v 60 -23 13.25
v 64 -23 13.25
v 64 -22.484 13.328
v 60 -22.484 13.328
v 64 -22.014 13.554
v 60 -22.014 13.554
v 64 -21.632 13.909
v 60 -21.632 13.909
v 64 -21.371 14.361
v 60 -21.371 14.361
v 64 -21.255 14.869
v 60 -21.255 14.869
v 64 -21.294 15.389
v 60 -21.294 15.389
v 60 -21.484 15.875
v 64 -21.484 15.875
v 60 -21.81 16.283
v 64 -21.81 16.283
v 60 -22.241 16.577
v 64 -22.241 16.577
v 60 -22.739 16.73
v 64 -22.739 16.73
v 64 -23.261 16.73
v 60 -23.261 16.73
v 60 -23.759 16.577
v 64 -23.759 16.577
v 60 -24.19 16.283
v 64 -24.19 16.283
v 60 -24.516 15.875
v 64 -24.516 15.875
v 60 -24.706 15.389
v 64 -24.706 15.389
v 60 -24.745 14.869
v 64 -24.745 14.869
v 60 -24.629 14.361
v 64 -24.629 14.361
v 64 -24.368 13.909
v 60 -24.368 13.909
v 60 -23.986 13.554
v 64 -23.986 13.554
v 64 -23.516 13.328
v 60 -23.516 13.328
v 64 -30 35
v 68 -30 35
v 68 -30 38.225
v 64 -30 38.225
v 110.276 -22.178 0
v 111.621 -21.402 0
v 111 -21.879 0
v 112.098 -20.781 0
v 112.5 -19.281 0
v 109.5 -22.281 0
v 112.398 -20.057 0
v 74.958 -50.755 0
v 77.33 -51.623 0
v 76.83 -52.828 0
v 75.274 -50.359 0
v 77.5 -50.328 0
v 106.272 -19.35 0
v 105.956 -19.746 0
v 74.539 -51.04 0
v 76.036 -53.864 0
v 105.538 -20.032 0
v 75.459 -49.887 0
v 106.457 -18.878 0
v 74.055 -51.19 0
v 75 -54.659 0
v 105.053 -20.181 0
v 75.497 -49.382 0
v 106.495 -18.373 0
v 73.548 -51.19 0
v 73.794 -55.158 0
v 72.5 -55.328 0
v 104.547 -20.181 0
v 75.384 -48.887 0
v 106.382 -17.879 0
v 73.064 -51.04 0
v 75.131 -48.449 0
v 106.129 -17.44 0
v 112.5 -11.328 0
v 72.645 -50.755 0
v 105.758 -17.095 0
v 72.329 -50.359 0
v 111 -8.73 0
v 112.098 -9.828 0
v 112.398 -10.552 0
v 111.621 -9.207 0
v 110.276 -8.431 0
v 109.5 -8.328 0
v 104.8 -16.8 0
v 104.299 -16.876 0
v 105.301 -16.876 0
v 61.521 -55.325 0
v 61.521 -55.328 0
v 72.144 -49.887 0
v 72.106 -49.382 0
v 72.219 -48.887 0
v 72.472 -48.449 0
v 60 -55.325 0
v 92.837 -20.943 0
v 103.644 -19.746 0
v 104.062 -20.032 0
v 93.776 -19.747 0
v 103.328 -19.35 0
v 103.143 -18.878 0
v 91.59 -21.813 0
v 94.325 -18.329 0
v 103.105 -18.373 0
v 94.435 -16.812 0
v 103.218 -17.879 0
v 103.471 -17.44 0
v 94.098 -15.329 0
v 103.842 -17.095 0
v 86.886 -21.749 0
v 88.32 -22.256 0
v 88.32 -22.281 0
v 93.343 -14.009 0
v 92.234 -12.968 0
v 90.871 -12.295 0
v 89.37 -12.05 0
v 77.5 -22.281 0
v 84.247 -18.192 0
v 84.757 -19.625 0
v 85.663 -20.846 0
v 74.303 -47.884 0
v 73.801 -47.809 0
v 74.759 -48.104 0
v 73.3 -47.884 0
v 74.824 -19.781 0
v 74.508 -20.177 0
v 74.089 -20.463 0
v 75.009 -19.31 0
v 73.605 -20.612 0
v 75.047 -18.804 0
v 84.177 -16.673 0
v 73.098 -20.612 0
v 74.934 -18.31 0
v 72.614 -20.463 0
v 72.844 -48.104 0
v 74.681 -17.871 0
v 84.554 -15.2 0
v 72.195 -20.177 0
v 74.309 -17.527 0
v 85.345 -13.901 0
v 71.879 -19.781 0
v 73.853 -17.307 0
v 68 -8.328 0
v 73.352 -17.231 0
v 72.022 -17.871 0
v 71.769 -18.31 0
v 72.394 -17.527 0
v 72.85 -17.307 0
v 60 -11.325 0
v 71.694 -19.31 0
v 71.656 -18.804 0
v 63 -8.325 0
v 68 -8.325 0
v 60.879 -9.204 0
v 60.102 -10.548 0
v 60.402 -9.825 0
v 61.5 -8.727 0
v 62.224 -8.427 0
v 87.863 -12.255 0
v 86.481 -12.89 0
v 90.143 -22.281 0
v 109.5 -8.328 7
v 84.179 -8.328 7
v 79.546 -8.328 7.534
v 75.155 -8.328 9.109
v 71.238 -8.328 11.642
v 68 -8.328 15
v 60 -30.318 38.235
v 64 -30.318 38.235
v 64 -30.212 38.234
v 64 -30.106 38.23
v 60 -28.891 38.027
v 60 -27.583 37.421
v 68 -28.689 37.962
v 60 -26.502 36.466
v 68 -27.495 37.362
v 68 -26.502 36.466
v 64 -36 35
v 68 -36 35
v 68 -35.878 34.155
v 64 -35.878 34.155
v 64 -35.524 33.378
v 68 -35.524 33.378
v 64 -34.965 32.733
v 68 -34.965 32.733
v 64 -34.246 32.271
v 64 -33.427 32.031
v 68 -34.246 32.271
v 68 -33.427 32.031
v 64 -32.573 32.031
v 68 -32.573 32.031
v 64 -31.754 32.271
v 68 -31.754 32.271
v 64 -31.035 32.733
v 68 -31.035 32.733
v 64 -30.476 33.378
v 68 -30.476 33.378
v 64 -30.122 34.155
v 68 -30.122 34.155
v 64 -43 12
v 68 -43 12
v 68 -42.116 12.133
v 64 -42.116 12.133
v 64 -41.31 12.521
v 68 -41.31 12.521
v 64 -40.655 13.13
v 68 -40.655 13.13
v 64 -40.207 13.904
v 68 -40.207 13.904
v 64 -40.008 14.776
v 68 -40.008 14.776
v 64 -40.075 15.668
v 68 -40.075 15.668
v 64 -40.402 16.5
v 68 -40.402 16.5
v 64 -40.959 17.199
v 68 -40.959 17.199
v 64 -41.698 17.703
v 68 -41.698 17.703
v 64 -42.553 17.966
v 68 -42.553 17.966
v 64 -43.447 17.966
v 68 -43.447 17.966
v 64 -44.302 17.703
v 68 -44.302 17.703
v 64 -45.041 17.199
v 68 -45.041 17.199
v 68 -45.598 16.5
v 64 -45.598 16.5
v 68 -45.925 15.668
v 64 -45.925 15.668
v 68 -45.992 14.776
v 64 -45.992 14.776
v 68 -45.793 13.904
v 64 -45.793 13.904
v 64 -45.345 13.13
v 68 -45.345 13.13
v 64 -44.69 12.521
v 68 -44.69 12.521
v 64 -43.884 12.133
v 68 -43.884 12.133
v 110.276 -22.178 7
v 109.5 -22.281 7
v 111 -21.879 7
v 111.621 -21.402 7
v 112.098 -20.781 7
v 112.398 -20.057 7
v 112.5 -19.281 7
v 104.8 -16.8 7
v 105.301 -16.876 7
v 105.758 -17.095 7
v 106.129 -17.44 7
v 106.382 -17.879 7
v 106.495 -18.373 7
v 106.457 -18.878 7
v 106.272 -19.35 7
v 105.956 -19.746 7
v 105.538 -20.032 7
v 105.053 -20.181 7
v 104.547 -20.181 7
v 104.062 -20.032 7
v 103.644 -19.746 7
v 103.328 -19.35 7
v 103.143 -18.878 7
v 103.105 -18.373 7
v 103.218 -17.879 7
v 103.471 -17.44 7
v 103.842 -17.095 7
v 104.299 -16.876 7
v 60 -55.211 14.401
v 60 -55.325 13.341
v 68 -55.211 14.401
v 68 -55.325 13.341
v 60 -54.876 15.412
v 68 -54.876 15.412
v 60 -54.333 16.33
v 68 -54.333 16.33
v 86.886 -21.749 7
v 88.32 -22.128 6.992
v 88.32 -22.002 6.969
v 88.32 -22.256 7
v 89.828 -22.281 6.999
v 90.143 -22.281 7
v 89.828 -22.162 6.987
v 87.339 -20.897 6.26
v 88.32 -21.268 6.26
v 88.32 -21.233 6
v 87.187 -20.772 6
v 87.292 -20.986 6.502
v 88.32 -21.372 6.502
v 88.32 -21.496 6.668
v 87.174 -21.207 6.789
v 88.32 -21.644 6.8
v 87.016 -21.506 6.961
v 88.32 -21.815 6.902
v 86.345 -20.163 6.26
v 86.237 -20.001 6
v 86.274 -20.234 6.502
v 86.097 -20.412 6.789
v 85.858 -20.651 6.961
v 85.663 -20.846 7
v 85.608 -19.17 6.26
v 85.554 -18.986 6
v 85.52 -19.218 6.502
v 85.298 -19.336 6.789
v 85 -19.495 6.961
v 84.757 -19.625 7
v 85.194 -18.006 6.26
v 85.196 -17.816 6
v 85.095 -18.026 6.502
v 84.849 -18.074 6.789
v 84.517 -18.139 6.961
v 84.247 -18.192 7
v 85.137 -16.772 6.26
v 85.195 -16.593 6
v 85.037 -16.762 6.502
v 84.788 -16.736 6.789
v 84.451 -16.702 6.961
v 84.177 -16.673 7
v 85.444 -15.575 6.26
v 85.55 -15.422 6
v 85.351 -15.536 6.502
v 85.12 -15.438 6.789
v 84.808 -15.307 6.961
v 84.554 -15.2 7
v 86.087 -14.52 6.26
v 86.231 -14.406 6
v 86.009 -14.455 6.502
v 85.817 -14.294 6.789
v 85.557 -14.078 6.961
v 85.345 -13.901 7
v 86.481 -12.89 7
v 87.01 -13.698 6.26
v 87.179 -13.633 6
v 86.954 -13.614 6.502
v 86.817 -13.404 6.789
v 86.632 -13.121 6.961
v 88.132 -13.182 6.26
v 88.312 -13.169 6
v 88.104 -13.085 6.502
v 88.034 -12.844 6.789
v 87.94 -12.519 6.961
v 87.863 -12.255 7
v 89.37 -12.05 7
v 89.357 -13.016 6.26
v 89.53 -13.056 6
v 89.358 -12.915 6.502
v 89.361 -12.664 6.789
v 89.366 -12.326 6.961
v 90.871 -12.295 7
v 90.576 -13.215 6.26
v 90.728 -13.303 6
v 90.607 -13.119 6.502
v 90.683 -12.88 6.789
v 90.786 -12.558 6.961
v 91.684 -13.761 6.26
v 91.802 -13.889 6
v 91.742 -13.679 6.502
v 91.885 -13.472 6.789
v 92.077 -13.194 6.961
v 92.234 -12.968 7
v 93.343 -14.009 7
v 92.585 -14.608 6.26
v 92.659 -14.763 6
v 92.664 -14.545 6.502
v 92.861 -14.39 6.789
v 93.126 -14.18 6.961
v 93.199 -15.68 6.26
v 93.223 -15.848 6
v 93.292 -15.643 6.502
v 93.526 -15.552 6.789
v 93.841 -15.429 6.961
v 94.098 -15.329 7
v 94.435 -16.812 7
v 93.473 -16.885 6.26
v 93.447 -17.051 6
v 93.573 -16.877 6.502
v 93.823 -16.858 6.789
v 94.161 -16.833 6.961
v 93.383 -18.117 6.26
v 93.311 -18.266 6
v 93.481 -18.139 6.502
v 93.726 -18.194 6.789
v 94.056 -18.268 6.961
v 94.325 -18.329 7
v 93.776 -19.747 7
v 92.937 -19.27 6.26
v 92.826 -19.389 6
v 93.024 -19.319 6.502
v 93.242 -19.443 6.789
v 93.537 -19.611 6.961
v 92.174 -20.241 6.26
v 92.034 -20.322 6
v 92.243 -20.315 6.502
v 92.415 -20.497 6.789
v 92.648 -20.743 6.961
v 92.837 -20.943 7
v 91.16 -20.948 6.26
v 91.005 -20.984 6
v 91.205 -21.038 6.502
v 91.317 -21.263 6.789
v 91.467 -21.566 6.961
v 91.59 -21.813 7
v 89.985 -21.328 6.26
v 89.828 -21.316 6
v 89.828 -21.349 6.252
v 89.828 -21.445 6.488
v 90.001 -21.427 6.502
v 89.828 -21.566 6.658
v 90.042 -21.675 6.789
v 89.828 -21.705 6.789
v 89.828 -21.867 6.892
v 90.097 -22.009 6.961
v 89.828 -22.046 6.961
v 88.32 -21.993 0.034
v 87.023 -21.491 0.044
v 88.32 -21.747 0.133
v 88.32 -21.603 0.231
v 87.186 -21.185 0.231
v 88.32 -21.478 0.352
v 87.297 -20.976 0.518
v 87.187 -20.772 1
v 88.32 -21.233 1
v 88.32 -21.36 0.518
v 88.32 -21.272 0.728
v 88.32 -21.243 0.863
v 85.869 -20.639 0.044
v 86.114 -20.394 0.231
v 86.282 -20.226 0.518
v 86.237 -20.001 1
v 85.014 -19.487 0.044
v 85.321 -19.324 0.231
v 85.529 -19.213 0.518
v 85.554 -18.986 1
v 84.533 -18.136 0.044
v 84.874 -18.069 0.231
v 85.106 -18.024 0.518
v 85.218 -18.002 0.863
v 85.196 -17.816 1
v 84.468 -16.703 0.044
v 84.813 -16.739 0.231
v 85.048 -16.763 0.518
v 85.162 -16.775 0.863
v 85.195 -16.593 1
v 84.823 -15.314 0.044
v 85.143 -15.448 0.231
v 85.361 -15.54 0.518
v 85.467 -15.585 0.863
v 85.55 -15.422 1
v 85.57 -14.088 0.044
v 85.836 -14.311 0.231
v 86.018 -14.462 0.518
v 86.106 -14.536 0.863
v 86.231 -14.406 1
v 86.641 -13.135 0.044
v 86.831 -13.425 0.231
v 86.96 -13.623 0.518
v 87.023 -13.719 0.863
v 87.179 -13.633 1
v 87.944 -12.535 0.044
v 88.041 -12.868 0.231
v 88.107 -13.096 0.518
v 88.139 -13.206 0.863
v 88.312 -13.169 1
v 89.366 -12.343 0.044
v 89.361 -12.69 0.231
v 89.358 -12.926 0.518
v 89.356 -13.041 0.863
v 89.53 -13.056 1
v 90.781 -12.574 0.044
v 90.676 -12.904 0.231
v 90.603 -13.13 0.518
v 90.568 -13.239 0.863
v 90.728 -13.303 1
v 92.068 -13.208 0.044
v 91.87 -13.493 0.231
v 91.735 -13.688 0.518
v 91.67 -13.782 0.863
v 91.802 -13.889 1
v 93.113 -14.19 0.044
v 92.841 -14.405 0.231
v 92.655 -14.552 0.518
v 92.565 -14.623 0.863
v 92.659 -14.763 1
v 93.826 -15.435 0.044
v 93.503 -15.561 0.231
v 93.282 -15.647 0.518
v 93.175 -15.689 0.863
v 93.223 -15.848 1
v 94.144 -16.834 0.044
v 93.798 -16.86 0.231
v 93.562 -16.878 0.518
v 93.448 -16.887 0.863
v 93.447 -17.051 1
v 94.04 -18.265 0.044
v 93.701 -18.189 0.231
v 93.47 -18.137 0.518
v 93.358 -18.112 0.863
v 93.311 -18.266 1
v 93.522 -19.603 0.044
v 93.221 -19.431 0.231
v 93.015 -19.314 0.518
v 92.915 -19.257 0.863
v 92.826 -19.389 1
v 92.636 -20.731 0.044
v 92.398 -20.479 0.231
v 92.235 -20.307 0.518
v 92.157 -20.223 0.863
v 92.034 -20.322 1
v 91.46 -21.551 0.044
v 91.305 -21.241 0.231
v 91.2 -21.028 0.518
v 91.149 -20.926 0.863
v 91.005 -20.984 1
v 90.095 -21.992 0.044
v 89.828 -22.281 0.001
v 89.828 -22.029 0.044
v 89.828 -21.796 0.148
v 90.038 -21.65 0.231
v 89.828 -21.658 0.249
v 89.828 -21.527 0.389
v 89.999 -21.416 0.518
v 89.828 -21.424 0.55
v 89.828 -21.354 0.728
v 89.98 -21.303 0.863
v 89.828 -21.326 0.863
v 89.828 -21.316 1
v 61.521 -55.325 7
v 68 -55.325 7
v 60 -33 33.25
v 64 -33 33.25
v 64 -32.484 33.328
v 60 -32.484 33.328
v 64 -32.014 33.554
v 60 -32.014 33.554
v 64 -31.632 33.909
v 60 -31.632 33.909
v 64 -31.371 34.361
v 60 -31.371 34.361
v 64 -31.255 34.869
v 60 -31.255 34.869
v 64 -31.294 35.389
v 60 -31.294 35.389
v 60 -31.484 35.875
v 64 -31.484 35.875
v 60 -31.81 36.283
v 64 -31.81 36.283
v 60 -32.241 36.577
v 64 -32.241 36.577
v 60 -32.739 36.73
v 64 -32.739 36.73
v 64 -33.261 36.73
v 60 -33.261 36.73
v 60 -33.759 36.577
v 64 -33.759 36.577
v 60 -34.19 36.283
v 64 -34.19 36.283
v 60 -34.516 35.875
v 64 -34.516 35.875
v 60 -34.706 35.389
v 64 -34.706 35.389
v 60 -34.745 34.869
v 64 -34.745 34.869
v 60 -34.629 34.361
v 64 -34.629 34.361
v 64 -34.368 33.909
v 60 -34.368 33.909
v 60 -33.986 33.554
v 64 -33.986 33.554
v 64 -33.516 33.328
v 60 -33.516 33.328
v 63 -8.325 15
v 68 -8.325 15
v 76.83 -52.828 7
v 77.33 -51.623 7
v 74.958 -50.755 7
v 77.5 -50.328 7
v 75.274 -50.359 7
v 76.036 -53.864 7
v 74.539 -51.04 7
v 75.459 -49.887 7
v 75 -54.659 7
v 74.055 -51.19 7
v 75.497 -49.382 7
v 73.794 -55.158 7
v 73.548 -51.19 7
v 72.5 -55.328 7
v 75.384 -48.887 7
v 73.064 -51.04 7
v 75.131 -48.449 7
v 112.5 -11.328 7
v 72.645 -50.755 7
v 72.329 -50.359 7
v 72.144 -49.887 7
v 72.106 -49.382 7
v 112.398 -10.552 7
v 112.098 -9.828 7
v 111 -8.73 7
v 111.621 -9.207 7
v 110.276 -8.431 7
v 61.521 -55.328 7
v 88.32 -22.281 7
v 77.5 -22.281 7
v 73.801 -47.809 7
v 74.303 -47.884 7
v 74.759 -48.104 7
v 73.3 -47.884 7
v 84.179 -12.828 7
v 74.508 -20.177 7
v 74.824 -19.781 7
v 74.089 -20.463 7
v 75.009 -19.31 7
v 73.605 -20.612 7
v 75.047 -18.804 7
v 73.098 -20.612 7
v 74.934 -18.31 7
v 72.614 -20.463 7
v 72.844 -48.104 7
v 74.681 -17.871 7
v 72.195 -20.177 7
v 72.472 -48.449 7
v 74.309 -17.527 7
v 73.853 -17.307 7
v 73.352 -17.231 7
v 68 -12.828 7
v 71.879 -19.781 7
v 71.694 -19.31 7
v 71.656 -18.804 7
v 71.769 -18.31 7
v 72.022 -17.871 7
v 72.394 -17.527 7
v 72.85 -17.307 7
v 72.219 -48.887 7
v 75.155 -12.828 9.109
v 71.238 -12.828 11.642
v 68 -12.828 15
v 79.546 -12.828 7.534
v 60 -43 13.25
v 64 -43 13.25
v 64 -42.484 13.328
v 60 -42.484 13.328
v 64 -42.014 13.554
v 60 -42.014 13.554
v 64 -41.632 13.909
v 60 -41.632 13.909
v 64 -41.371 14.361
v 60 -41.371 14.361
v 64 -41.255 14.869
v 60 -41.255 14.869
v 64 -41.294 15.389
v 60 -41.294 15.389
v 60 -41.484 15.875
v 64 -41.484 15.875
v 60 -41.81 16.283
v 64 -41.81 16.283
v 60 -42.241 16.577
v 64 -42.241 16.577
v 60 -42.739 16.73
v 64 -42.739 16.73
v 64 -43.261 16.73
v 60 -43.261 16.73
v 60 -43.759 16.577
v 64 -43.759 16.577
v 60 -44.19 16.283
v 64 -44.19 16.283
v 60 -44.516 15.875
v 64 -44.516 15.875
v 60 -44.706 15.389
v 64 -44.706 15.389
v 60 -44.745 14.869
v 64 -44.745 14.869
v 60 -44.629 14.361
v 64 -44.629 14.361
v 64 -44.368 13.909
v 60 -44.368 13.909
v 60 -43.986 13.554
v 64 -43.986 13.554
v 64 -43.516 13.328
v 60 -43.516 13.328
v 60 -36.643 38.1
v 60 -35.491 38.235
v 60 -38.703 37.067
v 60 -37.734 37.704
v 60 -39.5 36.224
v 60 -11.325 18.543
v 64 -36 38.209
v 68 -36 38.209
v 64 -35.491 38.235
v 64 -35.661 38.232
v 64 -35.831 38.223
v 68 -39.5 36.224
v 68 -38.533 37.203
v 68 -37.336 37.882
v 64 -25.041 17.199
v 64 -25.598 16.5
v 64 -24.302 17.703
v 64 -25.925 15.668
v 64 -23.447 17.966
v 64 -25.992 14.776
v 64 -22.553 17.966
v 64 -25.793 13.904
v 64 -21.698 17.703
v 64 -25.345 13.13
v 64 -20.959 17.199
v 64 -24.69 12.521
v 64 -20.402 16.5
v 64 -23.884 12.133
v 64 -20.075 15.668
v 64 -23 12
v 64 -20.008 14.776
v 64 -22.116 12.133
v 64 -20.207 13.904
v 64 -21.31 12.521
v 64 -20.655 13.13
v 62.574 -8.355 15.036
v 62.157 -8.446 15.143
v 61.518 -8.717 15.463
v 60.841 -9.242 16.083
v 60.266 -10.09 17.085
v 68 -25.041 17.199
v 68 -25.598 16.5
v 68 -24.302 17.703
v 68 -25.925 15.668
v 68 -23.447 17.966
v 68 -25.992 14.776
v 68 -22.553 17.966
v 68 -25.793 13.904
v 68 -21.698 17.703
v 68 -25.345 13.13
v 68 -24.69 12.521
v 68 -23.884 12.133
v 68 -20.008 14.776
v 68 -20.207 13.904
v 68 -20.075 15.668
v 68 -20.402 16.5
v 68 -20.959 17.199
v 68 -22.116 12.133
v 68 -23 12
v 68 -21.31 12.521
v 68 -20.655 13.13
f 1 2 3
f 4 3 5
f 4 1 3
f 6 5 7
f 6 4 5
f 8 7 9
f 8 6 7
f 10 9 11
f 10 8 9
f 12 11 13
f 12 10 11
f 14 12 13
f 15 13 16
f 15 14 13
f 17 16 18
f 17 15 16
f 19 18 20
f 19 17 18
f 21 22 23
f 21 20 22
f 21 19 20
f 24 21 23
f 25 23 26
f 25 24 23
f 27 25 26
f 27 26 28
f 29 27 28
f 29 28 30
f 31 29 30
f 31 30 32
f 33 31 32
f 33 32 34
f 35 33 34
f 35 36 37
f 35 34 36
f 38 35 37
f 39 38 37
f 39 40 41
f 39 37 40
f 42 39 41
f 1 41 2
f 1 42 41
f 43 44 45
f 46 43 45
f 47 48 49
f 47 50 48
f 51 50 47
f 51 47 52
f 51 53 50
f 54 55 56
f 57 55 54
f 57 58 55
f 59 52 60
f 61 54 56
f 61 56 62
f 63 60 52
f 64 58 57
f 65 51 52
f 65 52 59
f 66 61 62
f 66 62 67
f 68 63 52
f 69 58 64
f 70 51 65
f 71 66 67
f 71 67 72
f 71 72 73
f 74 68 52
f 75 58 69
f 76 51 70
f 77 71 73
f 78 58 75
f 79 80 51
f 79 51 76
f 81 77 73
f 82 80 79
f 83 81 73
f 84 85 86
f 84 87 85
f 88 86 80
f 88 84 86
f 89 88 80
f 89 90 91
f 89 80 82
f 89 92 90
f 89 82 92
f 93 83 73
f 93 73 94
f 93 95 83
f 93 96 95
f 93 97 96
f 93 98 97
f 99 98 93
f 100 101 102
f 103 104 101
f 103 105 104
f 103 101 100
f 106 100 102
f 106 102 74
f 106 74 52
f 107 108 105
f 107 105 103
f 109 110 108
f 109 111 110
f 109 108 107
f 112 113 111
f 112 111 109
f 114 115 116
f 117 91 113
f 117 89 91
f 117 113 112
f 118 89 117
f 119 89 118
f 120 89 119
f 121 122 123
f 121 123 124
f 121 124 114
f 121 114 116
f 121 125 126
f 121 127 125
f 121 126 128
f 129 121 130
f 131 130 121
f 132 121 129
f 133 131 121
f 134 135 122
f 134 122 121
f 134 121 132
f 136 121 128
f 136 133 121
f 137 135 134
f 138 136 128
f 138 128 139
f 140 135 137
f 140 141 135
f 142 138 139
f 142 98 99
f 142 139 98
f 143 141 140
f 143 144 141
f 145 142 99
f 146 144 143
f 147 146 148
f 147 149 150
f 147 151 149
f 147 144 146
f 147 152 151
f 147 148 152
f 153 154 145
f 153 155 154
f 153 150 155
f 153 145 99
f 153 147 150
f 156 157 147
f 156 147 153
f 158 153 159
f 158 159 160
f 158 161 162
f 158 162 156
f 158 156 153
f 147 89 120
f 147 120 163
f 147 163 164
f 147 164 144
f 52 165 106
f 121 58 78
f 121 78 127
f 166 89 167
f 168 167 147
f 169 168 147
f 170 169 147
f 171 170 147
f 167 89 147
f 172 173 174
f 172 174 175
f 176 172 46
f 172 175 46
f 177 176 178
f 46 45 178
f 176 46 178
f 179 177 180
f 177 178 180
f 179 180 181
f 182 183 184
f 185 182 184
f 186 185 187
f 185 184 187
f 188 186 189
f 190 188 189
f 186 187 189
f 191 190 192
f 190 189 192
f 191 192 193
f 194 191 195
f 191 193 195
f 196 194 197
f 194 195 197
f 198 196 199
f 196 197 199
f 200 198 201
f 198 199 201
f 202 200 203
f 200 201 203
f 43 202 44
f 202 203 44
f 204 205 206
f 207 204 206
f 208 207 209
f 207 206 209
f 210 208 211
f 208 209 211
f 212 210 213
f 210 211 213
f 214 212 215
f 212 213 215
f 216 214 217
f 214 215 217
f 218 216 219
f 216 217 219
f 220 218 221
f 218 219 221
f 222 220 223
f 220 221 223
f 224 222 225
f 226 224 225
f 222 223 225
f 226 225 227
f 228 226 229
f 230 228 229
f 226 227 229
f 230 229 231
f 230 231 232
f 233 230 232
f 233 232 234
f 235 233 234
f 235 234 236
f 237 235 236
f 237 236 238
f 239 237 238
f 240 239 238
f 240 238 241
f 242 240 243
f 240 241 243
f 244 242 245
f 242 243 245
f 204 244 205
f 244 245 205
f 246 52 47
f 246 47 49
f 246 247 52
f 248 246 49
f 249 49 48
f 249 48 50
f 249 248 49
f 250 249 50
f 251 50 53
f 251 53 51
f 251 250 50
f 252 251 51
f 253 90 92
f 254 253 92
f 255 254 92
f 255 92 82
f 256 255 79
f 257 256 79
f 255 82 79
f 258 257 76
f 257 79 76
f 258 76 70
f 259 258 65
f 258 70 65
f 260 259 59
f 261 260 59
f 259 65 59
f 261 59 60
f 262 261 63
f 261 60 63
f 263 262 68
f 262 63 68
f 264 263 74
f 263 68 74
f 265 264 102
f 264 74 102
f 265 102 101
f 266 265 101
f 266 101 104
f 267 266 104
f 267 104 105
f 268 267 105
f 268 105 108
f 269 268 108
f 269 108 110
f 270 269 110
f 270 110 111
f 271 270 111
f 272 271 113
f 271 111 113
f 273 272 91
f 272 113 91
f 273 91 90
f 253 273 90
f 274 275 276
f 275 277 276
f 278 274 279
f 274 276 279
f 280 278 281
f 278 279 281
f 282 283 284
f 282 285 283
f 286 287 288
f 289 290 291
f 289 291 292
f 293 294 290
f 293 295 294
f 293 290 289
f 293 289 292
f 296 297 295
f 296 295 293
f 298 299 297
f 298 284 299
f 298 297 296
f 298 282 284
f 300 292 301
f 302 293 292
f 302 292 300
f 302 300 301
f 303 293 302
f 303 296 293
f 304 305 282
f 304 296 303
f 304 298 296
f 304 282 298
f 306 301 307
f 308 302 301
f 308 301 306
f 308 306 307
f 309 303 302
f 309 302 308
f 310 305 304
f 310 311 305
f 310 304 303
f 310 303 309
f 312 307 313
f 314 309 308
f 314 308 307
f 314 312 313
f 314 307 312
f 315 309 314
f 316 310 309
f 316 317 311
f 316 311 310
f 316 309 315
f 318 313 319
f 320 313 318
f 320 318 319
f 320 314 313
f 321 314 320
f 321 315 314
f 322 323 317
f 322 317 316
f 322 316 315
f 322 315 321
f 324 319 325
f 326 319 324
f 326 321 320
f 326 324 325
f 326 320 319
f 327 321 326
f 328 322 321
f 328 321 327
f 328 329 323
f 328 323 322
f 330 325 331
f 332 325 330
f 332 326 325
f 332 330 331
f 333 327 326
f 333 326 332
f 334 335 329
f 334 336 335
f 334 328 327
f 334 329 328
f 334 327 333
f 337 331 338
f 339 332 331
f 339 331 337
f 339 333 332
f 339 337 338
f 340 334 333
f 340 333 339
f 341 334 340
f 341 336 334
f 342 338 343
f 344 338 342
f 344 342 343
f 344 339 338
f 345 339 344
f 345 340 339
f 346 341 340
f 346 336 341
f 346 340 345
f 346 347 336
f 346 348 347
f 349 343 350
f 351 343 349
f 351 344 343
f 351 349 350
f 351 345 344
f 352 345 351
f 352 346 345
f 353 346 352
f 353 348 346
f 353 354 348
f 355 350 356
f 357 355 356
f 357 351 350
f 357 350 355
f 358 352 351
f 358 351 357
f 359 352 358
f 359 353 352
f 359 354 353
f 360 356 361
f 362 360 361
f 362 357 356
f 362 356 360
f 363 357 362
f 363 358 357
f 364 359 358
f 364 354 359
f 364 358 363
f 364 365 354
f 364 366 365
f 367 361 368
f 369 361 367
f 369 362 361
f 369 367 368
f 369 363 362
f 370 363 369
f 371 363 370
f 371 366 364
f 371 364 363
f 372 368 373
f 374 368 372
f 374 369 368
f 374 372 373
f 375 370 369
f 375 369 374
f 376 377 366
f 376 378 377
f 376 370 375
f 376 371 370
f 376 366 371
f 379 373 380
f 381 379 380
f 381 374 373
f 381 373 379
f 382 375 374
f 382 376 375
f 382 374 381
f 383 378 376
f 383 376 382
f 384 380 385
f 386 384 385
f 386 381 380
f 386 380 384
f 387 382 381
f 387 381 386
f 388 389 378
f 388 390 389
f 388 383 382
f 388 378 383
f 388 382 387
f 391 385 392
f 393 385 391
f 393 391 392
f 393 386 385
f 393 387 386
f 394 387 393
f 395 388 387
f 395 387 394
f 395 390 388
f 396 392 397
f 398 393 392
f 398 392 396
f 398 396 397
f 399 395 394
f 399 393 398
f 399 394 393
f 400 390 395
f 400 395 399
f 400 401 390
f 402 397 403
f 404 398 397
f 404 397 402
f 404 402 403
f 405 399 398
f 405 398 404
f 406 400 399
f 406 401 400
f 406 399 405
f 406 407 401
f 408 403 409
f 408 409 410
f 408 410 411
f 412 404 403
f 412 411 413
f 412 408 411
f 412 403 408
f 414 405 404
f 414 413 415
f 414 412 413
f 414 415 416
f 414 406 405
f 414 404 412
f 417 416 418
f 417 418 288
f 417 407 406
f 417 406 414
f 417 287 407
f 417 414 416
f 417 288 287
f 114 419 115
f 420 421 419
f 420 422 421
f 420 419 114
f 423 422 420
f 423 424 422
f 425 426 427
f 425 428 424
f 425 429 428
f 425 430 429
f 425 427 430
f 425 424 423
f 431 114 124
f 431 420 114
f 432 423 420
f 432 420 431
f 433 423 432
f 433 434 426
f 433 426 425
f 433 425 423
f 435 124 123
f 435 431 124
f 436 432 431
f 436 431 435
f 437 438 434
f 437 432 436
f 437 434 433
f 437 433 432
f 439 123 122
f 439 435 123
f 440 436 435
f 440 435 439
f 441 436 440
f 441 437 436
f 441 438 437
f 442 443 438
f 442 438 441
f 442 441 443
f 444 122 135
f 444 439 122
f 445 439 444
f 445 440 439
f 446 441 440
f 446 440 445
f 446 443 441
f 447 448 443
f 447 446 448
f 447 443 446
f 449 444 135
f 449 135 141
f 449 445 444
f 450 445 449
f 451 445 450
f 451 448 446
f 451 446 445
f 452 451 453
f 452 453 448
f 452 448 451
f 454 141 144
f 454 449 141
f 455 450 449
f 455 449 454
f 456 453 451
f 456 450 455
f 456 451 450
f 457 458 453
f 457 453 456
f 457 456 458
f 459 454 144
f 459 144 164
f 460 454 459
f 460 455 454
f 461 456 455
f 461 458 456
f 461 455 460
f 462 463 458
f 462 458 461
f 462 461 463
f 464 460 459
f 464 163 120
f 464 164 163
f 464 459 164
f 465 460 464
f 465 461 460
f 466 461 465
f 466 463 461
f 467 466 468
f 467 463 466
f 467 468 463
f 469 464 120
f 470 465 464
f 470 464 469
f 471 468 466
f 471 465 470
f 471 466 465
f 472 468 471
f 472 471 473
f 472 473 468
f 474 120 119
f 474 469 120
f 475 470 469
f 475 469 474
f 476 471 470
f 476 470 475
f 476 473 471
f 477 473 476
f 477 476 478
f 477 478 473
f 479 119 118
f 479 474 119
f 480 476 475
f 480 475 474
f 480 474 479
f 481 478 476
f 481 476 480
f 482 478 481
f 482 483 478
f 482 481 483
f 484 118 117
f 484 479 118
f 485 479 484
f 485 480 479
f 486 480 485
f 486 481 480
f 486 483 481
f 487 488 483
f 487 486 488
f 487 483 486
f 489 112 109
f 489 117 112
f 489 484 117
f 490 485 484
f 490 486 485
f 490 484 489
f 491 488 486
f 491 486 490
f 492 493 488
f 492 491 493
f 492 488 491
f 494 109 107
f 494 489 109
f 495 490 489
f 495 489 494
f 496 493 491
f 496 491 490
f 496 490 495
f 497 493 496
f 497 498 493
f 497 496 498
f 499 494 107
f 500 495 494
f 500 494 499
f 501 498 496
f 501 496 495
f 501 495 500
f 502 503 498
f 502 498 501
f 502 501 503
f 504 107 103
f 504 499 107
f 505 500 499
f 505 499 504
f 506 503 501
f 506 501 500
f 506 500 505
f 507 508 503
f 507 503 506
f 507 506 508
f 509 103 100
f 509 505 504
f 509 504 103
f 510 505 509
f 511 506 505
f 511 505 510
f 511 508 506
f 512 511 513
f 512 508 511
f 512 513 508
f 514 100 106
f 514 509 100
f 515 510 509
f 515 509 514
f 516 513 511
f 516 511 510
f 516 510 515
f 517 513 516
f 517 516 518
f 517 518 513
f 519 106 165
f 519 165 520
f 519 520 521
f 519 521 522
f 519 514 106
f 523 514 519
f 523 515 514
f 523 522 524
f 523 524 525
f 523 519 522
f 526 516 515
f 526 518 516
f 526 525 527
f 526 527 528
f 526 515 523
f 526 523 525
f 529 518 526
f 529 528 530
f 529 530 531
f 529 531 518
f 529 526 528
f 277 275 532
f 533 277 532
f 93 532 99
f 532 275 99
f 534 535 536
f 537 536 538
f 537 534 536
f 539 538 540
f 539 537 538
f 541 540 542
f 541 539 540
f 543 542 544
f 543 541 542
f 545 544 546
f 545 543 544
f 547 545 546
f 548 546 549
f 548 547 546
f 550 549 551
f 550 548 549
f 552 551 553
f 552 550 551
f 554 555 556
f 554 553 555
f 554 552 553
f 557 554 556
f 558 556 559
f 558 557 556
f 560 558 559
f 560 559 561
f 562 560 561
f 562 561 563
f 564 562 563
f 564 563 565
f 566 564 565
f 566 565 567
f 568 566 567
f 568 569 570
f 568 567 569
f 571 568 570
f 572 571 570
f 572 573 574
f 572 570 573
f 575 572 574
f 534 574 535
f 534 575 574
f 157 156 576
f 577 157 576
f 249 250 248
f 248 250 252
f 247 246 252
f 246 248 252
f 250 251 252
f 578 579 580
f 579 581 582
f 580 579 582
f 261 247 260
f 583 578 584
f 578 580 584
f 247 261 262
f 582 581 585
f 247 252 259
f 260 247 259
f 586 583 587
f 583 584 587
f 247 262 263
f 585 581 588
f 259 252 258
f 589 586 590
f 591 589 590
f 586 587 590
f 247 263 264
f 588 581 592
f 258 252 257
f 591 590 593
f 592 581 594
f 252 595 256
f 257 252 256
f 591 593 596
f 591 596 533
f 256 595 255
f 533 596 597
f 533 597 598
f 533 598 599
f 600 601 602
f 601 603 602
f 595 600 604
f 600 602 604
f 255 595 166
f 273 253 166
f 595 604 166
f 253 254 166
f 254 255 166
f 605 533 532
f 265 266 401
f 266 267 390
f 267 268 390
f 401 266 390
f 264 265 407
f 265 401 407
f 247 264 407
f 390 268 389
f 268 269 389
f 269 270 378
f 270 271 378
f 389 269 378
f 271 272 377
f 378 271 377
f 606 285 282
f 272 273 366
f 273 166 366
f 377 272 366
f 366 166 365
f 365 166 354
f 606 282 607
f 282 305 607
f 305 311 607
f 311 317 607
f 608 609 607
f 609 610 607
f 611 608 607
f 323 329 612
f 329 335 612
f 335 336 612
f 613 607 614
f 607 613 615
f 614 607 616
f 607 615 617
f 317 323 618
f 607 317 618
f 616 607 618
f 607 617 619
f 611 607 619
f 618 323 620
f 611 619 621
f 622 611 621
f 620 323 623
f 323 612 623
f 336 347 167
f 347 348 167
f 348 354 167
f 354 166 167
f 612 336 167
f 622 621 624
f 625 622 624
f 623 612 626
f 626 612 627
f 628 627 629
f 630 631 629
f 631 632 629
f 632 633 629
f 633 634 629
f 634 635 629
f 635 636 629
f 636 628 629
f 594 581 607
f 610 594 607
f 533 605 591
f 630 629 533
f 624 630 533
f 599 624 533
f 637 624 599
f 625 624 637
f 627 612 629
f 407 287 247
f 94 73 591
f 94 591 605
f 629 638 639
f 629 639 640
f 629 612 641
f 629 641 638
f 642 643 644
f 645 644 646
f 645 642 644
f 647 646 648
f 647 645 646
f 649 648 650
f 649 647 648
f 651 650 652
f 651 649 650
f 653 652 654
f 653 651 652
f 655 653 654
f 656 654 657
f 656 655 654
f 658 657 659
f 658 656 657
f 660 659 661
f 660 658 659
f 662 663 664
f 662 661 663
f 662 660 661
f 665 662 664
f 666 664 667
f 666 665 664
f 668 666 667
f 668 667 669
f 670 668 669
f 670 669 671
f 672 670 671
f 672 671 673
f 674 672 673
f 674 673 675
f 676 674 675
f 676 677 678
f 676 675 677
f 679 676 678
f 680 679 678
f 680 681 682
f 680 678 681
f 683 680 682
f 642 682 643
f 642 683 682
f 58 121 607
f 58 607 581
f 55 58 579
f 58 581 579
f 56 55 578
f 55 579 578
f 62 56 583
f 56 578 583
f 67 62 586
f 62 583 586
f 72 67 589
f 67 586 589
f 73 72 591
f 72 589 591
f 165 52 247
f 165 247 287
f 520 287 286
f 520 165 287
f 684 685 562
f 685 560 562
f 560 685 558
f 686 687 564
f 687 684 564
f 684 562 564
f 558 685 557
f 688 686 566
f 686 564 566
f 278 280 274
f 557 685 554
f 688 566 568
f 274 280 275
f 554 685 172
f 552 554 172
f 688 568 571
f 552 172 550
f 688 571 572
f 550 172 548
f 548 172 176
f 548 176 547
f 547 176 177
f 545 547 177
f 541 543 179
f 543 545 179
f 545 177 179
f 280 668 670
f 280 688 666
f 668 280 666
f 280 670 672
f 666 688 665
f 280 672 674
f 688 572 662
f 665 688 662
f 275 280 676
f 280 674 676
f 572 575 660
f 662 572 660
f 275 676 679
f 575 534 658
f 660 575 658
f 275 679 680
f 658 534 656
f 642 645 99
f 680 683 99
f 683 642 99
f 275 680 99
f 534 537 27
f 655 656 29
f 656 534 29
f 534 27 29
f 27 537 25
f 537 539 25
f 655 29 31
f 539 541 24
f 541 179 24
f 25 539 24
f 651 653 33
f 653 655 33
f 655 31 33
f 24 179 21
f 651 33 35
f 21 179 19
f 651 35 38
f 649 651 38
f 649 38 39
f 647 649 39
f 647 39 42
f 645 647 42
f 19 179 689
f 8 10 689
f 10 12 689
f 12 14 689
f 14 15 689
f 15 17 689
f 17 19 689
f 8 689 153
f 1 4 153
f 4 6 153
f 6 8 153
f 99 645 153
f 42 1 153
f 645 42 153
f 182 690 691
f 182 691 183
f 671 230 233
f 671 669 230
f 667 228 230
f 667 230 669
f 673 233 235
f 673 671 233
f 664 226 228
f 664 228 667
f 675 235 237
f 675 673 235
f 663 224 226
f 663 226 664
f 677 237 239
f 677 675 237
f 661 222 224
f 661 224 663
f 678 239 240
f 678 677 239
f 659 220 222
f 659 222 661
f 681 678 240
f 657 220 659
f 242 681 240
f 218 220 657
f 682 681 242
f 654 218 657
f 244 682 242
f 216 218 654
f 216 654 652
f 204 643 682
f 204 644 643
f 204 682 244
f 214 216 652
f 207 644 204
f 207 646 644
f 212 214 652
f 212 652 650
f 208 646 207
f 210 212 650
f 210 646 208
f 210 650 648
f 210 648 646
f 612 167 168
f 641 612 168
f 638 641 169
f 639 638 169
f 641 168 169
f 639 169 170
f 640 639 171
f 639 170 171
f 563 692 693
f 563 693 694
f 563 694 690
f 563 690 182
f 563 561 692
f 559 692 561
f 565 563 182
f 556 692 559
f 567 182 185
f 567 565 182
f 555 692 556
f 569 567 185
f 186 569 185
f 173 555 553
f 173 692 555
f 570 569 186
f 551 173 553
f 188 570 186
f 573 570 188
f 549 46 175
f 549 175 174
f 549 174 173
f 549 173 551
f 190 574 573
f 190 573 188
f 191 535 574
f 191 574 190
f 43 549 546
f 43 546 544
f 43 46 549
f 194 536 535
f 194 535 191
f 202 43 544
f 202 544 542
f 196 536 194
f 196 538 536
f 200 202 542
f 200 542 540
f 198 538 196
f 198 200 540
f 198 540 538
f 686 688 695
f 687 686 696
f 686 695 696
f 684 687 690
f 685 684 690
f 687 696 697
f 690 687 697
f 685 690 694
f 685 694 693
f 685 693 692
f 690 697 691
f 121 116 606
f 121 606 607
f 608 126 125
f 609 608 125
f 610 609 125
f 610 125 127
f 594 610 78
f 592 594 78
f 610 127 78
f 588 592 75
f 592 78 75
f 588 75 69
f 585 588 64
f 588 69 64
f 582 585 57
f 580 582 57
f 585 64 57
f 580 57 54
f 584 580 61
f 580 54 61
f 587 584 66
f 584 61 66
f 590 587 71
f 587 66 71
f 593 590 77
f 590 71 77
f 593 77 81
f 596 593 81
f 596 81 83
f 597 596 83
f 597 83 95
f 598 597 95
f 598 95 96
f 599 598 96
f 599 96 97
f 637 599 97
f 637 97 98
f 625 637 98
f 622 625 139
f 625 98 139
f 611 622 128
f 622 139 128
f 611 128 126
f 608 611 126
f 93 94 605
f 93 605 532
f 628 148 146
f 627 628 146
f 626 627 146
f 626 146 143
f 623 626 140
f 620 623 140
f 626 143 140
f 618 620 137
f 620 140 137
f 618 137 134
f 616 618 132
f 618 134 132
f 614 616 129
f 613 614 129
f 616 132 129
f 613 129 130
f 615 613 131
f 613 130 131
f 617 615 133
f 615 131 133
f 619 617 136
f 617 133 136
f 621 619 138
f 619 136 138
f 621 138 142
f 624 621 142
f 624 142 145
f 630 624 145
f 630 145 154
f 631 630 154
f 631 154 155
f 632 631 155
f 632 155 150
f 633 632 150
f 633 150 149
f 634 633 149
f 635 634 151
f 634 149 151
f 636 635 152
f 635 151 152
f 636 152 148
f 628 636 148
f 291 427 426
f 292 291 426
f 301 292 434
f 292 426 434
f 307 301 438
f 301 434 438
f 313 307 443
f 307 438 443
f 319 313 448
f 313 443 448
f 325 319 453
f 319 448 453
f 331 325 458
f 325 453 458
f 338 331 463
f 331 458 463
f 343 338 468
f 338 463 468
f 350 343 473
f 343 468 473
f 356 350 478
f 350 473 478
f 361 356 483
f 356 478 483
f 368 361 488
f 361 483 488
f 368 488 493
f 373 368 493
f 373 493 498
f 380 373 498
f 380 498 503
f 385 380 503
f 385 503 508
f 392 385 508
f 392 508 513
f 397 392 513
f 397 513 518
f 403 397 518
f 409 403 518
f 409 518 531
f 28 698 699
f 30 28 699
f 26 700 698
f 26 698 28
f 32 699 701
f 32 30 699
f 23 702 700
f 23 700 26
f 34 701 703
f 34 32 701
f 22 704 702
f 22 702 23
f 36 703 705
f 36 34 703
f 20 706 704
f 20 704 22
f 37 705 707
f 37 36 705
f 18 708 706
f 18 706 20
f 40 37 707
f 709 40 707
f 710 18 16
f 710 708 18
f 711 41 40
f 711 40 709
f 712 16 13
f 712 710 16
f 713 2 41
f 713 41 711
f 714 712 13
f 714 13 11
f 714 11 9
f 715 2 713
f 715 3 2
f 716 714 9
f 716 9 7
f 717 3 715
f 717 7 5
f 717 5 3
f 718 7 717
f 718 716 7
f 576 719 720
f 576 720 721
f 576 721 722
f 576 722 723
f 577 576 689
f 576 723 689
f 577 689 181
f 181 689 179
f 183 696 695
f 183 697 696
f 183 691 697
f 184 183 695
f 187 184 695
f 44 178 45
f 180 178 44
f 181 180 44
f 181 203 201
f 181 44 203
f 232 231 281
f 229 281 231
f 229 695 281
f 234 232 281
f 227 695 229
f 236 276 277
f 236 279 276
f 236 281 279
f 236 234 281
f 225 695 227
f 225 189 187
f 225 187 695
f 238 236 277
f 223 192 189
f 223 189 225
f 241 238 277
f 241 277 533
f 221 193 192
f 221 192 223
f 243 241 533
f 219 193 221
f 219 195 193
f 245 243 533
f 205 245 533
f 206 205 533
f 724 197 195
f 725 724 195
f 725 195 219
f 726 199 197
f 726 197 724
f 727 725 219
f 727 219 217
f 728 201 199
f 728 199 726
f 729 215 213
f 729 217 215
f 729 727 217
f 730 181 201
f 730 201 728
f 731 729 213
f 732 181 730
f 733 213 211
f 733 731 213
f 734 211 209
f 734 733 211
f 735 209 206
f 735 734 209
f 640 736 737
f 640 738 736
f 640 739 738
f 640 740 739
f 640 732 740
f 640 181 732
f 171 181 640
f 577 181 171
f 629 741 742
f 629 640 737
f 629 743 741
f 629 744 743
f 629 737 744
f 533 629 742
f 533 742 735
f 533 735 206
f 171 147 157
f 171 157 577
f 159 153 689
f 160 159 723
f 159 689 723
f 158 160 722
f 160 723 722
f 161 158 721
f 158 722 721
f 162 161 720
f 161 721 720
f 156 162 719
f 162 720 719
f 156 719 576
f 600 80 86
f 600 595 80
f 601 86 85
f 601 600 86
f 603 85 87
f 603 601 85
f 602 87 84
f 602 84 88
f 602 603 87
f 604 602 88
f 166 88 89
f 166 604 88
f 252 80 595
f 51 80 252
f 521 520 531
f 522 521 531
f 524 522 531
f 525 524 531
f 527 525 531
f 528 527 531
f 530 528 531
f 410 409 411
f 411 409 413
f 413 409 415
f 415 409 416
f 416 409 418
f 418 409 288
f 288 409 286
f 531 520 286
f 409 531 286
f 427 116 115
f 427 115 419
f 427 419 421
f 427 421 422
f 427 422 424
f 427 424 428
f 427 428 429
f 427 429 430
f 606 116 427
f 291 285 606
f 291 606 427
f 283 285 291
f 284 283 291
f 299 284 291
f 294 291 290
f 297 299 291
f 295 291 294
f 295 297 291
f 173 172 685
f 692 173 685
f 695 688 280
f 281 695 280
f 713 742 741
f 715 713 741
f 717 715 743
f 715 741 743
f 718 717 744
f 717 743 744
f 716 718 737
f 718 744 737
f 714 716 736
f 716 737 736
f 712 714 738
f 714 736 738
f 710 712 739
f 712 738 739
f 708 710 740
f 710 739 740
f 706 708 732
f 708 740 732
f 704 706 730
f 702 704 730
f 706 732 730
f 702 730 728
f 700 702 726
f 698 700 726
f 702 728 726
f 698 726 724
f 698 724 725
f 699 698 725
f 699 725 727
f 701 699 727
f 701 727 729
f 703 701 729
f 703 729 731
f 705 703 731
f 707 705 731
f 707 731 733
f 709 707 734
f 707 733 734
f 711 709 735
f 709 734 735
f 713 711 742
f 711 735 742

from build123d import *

# Parameters (mm, degrees)
SKETCH50_R         = 1.75
EXTRUDE1_DEPTH     = 8
SKETCH52_R         = 4.15
SKETCH52_R_2       = 1.7
EXTRUDE2_DEPTH     = 7
FILLET1_R          = 3
FILLET2_R          = 5
EXTRUDE3_DEPTH     = 4.5
FILLET4_R          = 5
FILLET5_R          = 3
SKETCH55_R         = 3
CUT_EXTRUDE3_DEPTH = 4
FILLET9_R          = 1
FILLET10_R         = 1
SKETCH57_W         = 1
SKETCH57_H         = 8.155835086
EXTRUDE4_DEPTH     = 4
CUT_EXTRUDE4_START = -7
SKETCH56_W         = 0.996940693
SKETCH56_H         = 2.63977817
CUT_EXTRUDE4_DEPTH = 7.000001


with BuildPart() as part:
    # Sketch50 → Extrude1 (new body)
    with BuildSketch(Plane(origin=(60, 0, 0), x_dir=(0, 0, -1), z_dir=(1, 0, 0))):
        Polygon((-38.234887292, -28), (-38.234887292, -38), (-15, -55.32486375), (0, -55.32486375), (0, -8.32486375), (-15, -8.32486375), align=None)
        with Locations((-35, -33)):
            Circle(SKETCH50_R, mode=Mode.SUBTRACT)
        with Locations((-15, -23)):
            Circle(SKETCH50_R, mode=Mode.SUBTRACT)
        with Locations((-15, -43)):
            Circle(SKETCH50_R, mode=Mode.SUBTRACT)
    extrude(amount=EXTRUDE1_DEPTH)

    # Sketch52 → Extrude2 (add)
    with BuildSketch(Plane(origin=(0, 0, 0), x_dir=(-1, 0, 0), z_dir=(0, 0, -1))):
        Polygon((-61.521067729, -55.328445544), (-61.521067729, -8.328445544), (-112.5, -8.328445544), (-112.5, -22.280627193), (-77.5, -22.280627193), (-77.5, -55.328445544), align=None)
        with Locations(Location((-89.299980942, -17.200015896, 0), (0, 0, 90))):
            Circle(SKETCH52_R, mode=Mode.SUBTRACT)
        with Locations(Location((-73.351535893, -18.931266408, 0), (0, 0, 90))):
            Circle(SKETCH52_R_2, mode=Mode.SUBTRACT)
        with Locations(Location((-104.8, -18.5, 0), (0, 0, 90))):
            Circle(SKETCH52_R_2, mode=Mode.SUBTRACT)
        with Locations(Location((-73.801481725, -49.508569042, 0), (0, 0, 90))):
            Circle(SKETCH52_R_2, mode=Mode.SUBTRACT)
    extrude(amount=-EXTRUDE2_DEPTH)

    # Fillet1
    fillet1_edges = [part.edges().sort_by_distance(p)[0] for p in [
        (112.5, -22.280627193, 3.5),
        (112.5, -8.328445544, 3.5),
    ]]
    fillet(fillet1_edges, radius=FILLET1_R)

    # Fillet2
    fillet2_edges = [part.edges().sort_by_distance(p)[0] for p in [
        (77.5, -55.328445544, 3.5),
    ]]
    fillet(fillet2_edges, radius=FILLET2_R)

    # Sketch54 → Extrude3 (add)
    with BuildSketch(Plane(origin=(0, -8.328445544, 0), x_dir=(1, 0, 0), z_dir=(0, 1, 0))):
        with BuildLine():
            Line((68, -15), (68, -7))
            Line((68, -7), (84.179453899, -7))
            ThreePointArc((84.179453899, -7), (75.154838555, -9.109252039), (68, -15))
        make_face()
    extrude(amount=-EXTRUDE3_DEPTH)

    # Fillet4
    fillet4_edges = [part.edges().sort_by_distance(p)[0] for p in [
        (64, -55.32486375, 15),
        (64, -38, 38.234887292),
        (64, -28, 38.234887292),
    ]]
    fillet(fillet4_edges, radius=FILLET4_R)

    # Fillet5
    fillet5_edges = [part.edges().sort_by_distance(p)[0] for p in [
        (60, -8.32486375, 7.5),
    ]]
    fillet(fillet5_edges, radius=FILLET5_R)

    # Sketch55 → Cut-Extrude3 (cut)
    with BuildSketch(Plane(origin=(68, 0, 0), x_dir=(0, 0, -1), z_dir=(1, 0, 0))):
        with Locations((-15, -23)):
            Circle(SKETCH55_R)
        with Locations((-15, -43)):
            Circle(SKETCH55_R)
        with BuildLine():
            Line((-35, -30), (-38.787900912, -30))
            Line((-38.787900912, -30), (-38.787900912, -36))
            Line((-38.787900912, -36), (-35, -36))
            ThreePointArc((-35, -36), (-32, -33), (-35, -30))
        make_face()
    extrude(amount=-CUT_EXTRUDE3_DEPTH, mode=Mode.SUBTRACT)

    # Fillet9
    # the kernel refuses this fillet: 1 mm, written as the material it takes off along each edge
    with BuildSketch(Plane(origin=(89.299980942, -17.200015896, 0), x_dir=(0, 1, 0), z_dir=(-1, 0, 0))) as fillet9_piece_1:
        with BuildLine():
            CenterArc((4.15 + FILLET9_R, -FILLET9_R), FILLET9_R, 90, 90)
            Line((4.15, -FILLET9_R), (4.15, 0))
            Line((4.15, 0), (4.15 + FILLET9_R, 0))
        make_face()
    revolve(axis=Axis((89.299980942, -17.200015896, 0), (0, 0, -1)), mode=Mode.SUBTRACT)

    # Fillet10
    # the kernel refuses this fillet: 1 mm, written as the material it takes off along each edge
    with BuildSketch(Plane(origin=(89.299980942, -17.200015896, 7), x_dir=(0, 1, 0), z_dir=(-1, 0, 0))) as fillet10_piece_1:
        with BuildLine():
            CenterArc((4.15 + FILLET10_R, FILLET10_R), FILLET10_R, 180, 90)
            Line((4.15, FILLET10_R), (4.15, 0))
            Line((4.15, 0), (4.15 + FILLET10_R, 0))
        make_face()
    revolve(axis=Axis((89.299980942, -17.200015896, 7), (0, 0, -1)), mode=Mode.SUBTRACT)

    # Sketch57 → Extrude4 (cut)
    with BuildSketch(Plane.XZ.offset(22.280627193)):
        with Locations((89.327585964, 3.449545077)):
            Rectangle(SKETCH57_W, SKETCH57_H)
    extrude(amount=-EXTRUDE4_DEPTH, mode=Mode.SUBTRACT)

    # Sketch56 → Cut-Extrude4 (cut)
    with BuildSketch(Plane(origin=(0, 0, 0), x_dir=(-1, 0, 0), z_dir=(0, 0, -1)).offset(CUT_EXTRUDE4_START)):
        with Locations((-88.818861809, -22.280627193)):
            Rectangle(SKETCH56_W, SKETCH56_H)
    extrude(amount=CUT_EXTRUDE4_DEPTH, mode=Mode.SUBTRACT)


solid = part.part
